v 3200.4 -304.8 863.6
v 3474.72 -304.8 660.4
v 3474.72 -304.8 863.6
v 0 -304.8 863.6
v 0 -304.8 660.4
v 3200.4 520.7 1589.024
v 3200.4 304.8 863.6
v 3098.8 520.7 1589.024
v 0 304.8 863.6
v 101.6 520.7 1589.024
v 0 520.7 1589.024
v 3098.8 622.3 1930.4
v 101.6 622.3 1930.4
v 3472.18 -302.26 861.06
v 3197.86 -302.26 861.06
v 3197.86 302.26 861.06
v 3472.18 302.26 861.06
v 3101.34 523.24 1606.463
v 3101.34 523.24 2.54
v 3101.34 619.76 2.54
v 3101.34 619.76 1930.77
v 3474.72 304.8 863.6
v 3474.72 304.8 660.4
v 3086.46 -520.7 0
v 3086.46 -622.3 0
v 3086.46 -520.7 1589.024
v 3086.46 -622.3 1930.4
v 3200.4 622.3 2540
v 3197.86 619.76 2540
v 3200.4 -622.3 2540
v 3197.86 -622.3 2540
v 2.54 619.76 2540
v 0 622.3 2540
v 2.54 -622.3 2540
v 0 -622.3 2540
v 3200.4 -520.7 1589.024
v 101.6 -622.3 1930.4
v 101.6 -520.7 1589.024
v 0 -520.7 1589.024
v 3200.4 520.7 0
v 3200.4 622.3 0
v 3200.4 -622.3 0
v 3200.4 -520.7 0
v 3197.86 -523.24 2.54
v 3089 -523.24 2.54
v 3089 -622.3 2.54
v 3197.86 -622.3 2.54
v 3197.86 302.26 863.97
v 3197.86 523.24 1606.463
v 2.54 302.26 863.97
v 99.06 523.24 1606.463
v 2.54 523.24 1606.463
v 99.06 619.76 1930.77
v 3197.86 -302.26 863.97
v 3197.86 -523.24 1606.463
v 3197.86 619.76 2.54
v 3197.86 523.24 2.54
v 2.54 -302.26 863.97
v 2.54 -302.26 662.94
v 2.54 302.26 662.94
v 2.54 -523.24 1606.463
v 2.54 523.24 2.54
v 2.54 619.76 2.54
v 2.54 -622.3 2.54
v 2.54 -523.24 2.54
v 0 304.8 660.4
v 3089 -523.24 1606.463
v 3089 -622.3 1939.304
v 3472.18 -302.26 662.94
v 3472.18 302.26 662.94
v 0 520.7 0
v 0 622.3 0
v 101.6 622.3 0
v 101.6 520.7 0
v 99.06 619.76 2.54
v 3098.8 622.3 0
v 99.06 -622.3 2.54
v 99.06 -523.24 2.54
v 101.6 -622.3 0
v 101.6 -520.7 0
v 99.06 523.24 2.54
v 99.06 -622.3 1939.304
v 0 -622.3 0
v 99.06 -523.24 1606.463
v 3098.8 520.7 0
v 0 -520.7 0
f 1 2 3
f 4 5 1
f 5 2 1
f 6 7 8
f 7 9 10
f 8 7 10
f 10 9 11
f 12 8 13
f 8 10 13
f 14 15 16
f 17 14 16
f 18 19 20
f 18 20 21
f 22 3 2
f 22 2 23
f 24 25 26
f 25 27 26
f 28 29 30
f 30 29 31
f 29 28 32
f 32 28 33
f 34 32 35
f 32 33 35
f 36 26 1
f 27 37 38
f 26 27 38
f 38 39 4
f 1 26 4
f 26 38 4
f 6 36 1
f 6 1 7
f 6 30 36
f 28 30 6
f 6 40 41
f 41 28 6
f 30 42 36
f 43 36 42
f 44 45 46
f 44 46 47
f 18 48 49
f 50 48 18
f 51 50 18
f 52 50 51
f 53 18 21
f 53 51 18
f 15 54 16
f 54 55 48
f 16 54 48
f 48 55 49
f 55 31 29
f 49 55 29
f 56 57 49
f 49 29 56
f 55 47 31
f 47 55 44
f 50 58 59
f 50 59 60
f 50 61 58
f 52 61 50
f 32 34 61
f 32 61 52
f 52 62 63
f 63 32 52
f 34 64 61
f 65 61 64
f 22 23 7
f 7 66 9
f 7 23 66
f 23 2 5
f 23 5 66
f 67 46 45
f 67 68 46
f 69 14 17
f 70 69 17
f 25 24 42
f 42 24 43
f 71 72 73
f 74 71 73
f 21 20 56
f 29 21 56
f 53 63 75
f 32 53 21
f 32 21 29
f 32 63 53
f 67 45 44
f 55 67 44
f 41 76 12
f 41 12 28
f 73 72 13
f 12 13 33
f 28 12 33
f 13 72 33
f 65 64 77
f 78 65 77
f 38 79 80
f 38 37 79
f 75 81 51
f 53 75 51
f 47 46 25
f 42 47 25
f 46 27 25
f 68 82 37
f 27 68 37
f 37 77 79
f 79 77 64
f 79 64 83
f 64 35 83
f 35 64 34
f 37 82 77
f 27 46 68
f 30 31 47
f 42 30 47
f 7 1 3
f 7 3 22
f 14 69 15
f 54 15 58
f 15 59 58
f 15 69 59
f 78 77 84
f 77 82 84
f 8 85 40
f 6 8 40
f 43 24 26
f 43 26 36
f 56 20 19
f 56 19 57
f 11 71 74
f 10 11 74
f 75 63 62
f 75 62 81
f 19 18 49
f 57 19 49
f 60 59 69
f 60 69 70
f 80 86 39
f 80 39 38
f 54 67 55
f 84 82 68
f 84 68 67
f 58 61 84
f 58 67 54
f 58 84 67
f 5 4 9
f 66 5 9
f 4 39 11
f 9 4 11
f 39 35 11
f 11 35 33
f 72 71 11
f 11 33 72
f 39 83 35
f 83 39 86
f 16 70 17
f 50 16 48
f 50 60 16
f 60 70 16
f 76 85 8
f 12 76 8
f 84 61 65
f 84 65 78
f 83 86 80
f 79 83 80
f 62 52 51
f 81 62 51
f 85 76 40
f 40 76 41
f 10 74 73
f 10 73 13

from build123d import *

# Parameters (mm, degrees)
F1_DEPTH = 3200.4
F2_W     = 113.9400005341
F2_H     = 101.6
F2_W_2   = 101.6
F4_W     = 609.6
F4_H     = 203.2
F5_DEPTH = 274.32
F6_T     = -2.54


with BuildPart() as f1:
    # F0 (on Right) → F1 (new body)
    with BuildSketch(Plane.YZ):
        Polygon((-304.8, 863.6), (-304.8, 660.4), (0, 660.4), (304.8, 660.4), (304.8, 863.6), (622.3, 1930.4), (622.3, 2540), (0, 2540), (-622.3, 2540), (-622.3, 1930.4), align=None)
    extrude(amount=F1_DEPTH)

    # F2 (on Top) → F3 (join, up to the next surface of F1)
    with BuildSketch(Plane.XY):
        with Locations((3143.429999733, -571.5)):
            Rectangle(F2_W, F2_H)
        with Locations((3149.6, 571.5)):
            Rectangle(F2_W_2, F2_H)
        with Locations((50.8, 571.5)):
            Rectangle(F2_W_2, F2_H)
        with Locations((50.8, -571.5)):
            Rectangle(F2_W_2, F2_H)
    extrude(until=Until.NEXT)

    # F4 (on face) → F5 (join)
    with BuildSketch(Plane.YZ.offset(3200.4)):
        with Locations((0, 762)):
            Rectangle(F4_W, F4_H)
    extrude(amount=F5_DEPTH)

    # F6
    f6_openings = [f1.faces().sort_by_distance(p)[0] for p in [
        (1600.2, 0, 2540),
        (1615.219326, -622.3, 2011.959545),
    ]]
    offset(amount=F6_T, openings=f6_openings, kind=Kind.INTERSECTION)


solid = f1.part
